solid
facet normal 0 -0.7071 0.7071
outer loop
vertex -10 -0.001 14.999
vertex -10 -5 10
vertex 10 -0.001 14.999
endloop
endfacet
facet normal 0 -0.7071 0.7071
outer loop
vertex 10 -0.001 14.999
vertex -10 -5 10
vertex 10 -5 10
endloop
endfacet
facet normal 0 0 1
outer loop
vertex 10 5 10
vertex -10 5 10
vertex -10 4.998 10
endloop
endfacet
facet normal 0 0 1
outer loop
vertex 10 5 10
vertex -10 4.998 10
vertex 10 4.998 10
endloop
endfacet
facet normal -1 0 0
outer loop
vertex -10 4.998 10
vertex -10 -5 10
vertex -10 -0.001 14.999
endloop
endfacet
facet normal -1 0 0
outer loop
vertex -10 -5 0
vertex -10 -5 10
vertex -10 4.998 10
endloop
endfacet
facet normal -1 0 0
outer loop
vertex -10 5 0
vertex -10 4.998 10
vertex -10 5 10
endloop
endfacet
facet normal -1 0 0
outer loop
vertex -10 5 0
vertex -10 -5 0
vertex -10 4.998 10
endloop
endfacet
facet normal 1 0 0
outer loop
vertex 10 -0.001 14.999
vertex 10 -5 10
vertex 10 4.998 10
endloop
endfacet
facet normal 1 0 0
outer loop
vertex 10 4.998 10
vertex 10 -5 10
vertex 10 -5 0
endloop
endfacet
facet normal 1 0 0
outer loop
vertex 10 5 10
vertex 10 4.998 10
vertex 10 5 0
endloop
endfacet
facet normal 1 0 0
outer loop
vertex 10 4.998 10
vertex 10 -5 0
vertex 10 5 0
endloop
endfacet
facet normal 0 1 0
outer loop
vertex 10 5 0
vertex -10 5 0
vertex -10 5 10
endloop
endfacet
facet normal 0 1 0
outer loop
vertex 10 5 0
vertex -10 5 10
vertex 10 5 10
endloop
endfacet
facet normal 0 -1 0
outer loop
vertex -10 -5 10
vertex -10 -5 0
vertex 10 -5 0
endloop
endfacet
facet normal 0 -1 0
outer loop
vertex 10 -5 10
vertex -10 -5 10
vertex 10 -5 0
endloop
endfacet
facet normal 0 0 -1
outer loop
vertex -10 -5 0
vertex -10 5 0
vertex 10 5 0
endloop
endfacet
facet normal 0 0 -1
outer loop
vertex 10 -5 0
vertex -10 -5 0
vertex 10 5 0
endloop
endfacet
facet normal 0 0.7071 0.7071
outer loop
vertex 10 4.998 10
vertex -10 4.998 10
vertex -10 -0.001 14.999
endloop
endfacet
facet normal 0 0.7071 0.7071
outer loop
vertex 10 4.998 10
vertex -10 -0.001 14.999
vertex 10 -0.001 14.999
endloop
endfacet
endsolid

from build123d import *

# Parameters (mm, degrees)
BOX001_W               = 20
BOX001_H               = 7.07
BOX001_DEPTH           = 7.07
BOX001_PLACEMENT_ANGLE = 44.999934
BOX_W                  = 20
BOX_H                  = 10
BOX_DEPTH              = 10


with BuildPart() as base:
    # Box001 → Box001 (new body)
    with BuildSketch(Plane.XY):
        with Locations((10, 3.535)):
            Rectangle(BOX001_W, BOX001_H)
    extrude(amount=BOX001_DEPTH)


with BuildPart() as base_1:
    # Box001 placement: moved
    add(base.part.moved(Location((-10, -5, 10))).rotate(Axis((-10, -5, 10), (-1, 0, 0)), BOX001_PLACEMENT_ANGLE))


with BuildPart() as fusion:
    # Box → Box (new body)
    with BuildSketch(Plane(origin=(-10, -5, 0), x_dir=(1, 0, 0), z_dir=(0, 0, 1))):
        with Locations((10, 5)):
            Rectangle(BOX_W, BOX_H)
    extrude(amount=BOX_DEPTH)

    # Fusion: union Base
    add(base_1.part)


solid = fusion.part
